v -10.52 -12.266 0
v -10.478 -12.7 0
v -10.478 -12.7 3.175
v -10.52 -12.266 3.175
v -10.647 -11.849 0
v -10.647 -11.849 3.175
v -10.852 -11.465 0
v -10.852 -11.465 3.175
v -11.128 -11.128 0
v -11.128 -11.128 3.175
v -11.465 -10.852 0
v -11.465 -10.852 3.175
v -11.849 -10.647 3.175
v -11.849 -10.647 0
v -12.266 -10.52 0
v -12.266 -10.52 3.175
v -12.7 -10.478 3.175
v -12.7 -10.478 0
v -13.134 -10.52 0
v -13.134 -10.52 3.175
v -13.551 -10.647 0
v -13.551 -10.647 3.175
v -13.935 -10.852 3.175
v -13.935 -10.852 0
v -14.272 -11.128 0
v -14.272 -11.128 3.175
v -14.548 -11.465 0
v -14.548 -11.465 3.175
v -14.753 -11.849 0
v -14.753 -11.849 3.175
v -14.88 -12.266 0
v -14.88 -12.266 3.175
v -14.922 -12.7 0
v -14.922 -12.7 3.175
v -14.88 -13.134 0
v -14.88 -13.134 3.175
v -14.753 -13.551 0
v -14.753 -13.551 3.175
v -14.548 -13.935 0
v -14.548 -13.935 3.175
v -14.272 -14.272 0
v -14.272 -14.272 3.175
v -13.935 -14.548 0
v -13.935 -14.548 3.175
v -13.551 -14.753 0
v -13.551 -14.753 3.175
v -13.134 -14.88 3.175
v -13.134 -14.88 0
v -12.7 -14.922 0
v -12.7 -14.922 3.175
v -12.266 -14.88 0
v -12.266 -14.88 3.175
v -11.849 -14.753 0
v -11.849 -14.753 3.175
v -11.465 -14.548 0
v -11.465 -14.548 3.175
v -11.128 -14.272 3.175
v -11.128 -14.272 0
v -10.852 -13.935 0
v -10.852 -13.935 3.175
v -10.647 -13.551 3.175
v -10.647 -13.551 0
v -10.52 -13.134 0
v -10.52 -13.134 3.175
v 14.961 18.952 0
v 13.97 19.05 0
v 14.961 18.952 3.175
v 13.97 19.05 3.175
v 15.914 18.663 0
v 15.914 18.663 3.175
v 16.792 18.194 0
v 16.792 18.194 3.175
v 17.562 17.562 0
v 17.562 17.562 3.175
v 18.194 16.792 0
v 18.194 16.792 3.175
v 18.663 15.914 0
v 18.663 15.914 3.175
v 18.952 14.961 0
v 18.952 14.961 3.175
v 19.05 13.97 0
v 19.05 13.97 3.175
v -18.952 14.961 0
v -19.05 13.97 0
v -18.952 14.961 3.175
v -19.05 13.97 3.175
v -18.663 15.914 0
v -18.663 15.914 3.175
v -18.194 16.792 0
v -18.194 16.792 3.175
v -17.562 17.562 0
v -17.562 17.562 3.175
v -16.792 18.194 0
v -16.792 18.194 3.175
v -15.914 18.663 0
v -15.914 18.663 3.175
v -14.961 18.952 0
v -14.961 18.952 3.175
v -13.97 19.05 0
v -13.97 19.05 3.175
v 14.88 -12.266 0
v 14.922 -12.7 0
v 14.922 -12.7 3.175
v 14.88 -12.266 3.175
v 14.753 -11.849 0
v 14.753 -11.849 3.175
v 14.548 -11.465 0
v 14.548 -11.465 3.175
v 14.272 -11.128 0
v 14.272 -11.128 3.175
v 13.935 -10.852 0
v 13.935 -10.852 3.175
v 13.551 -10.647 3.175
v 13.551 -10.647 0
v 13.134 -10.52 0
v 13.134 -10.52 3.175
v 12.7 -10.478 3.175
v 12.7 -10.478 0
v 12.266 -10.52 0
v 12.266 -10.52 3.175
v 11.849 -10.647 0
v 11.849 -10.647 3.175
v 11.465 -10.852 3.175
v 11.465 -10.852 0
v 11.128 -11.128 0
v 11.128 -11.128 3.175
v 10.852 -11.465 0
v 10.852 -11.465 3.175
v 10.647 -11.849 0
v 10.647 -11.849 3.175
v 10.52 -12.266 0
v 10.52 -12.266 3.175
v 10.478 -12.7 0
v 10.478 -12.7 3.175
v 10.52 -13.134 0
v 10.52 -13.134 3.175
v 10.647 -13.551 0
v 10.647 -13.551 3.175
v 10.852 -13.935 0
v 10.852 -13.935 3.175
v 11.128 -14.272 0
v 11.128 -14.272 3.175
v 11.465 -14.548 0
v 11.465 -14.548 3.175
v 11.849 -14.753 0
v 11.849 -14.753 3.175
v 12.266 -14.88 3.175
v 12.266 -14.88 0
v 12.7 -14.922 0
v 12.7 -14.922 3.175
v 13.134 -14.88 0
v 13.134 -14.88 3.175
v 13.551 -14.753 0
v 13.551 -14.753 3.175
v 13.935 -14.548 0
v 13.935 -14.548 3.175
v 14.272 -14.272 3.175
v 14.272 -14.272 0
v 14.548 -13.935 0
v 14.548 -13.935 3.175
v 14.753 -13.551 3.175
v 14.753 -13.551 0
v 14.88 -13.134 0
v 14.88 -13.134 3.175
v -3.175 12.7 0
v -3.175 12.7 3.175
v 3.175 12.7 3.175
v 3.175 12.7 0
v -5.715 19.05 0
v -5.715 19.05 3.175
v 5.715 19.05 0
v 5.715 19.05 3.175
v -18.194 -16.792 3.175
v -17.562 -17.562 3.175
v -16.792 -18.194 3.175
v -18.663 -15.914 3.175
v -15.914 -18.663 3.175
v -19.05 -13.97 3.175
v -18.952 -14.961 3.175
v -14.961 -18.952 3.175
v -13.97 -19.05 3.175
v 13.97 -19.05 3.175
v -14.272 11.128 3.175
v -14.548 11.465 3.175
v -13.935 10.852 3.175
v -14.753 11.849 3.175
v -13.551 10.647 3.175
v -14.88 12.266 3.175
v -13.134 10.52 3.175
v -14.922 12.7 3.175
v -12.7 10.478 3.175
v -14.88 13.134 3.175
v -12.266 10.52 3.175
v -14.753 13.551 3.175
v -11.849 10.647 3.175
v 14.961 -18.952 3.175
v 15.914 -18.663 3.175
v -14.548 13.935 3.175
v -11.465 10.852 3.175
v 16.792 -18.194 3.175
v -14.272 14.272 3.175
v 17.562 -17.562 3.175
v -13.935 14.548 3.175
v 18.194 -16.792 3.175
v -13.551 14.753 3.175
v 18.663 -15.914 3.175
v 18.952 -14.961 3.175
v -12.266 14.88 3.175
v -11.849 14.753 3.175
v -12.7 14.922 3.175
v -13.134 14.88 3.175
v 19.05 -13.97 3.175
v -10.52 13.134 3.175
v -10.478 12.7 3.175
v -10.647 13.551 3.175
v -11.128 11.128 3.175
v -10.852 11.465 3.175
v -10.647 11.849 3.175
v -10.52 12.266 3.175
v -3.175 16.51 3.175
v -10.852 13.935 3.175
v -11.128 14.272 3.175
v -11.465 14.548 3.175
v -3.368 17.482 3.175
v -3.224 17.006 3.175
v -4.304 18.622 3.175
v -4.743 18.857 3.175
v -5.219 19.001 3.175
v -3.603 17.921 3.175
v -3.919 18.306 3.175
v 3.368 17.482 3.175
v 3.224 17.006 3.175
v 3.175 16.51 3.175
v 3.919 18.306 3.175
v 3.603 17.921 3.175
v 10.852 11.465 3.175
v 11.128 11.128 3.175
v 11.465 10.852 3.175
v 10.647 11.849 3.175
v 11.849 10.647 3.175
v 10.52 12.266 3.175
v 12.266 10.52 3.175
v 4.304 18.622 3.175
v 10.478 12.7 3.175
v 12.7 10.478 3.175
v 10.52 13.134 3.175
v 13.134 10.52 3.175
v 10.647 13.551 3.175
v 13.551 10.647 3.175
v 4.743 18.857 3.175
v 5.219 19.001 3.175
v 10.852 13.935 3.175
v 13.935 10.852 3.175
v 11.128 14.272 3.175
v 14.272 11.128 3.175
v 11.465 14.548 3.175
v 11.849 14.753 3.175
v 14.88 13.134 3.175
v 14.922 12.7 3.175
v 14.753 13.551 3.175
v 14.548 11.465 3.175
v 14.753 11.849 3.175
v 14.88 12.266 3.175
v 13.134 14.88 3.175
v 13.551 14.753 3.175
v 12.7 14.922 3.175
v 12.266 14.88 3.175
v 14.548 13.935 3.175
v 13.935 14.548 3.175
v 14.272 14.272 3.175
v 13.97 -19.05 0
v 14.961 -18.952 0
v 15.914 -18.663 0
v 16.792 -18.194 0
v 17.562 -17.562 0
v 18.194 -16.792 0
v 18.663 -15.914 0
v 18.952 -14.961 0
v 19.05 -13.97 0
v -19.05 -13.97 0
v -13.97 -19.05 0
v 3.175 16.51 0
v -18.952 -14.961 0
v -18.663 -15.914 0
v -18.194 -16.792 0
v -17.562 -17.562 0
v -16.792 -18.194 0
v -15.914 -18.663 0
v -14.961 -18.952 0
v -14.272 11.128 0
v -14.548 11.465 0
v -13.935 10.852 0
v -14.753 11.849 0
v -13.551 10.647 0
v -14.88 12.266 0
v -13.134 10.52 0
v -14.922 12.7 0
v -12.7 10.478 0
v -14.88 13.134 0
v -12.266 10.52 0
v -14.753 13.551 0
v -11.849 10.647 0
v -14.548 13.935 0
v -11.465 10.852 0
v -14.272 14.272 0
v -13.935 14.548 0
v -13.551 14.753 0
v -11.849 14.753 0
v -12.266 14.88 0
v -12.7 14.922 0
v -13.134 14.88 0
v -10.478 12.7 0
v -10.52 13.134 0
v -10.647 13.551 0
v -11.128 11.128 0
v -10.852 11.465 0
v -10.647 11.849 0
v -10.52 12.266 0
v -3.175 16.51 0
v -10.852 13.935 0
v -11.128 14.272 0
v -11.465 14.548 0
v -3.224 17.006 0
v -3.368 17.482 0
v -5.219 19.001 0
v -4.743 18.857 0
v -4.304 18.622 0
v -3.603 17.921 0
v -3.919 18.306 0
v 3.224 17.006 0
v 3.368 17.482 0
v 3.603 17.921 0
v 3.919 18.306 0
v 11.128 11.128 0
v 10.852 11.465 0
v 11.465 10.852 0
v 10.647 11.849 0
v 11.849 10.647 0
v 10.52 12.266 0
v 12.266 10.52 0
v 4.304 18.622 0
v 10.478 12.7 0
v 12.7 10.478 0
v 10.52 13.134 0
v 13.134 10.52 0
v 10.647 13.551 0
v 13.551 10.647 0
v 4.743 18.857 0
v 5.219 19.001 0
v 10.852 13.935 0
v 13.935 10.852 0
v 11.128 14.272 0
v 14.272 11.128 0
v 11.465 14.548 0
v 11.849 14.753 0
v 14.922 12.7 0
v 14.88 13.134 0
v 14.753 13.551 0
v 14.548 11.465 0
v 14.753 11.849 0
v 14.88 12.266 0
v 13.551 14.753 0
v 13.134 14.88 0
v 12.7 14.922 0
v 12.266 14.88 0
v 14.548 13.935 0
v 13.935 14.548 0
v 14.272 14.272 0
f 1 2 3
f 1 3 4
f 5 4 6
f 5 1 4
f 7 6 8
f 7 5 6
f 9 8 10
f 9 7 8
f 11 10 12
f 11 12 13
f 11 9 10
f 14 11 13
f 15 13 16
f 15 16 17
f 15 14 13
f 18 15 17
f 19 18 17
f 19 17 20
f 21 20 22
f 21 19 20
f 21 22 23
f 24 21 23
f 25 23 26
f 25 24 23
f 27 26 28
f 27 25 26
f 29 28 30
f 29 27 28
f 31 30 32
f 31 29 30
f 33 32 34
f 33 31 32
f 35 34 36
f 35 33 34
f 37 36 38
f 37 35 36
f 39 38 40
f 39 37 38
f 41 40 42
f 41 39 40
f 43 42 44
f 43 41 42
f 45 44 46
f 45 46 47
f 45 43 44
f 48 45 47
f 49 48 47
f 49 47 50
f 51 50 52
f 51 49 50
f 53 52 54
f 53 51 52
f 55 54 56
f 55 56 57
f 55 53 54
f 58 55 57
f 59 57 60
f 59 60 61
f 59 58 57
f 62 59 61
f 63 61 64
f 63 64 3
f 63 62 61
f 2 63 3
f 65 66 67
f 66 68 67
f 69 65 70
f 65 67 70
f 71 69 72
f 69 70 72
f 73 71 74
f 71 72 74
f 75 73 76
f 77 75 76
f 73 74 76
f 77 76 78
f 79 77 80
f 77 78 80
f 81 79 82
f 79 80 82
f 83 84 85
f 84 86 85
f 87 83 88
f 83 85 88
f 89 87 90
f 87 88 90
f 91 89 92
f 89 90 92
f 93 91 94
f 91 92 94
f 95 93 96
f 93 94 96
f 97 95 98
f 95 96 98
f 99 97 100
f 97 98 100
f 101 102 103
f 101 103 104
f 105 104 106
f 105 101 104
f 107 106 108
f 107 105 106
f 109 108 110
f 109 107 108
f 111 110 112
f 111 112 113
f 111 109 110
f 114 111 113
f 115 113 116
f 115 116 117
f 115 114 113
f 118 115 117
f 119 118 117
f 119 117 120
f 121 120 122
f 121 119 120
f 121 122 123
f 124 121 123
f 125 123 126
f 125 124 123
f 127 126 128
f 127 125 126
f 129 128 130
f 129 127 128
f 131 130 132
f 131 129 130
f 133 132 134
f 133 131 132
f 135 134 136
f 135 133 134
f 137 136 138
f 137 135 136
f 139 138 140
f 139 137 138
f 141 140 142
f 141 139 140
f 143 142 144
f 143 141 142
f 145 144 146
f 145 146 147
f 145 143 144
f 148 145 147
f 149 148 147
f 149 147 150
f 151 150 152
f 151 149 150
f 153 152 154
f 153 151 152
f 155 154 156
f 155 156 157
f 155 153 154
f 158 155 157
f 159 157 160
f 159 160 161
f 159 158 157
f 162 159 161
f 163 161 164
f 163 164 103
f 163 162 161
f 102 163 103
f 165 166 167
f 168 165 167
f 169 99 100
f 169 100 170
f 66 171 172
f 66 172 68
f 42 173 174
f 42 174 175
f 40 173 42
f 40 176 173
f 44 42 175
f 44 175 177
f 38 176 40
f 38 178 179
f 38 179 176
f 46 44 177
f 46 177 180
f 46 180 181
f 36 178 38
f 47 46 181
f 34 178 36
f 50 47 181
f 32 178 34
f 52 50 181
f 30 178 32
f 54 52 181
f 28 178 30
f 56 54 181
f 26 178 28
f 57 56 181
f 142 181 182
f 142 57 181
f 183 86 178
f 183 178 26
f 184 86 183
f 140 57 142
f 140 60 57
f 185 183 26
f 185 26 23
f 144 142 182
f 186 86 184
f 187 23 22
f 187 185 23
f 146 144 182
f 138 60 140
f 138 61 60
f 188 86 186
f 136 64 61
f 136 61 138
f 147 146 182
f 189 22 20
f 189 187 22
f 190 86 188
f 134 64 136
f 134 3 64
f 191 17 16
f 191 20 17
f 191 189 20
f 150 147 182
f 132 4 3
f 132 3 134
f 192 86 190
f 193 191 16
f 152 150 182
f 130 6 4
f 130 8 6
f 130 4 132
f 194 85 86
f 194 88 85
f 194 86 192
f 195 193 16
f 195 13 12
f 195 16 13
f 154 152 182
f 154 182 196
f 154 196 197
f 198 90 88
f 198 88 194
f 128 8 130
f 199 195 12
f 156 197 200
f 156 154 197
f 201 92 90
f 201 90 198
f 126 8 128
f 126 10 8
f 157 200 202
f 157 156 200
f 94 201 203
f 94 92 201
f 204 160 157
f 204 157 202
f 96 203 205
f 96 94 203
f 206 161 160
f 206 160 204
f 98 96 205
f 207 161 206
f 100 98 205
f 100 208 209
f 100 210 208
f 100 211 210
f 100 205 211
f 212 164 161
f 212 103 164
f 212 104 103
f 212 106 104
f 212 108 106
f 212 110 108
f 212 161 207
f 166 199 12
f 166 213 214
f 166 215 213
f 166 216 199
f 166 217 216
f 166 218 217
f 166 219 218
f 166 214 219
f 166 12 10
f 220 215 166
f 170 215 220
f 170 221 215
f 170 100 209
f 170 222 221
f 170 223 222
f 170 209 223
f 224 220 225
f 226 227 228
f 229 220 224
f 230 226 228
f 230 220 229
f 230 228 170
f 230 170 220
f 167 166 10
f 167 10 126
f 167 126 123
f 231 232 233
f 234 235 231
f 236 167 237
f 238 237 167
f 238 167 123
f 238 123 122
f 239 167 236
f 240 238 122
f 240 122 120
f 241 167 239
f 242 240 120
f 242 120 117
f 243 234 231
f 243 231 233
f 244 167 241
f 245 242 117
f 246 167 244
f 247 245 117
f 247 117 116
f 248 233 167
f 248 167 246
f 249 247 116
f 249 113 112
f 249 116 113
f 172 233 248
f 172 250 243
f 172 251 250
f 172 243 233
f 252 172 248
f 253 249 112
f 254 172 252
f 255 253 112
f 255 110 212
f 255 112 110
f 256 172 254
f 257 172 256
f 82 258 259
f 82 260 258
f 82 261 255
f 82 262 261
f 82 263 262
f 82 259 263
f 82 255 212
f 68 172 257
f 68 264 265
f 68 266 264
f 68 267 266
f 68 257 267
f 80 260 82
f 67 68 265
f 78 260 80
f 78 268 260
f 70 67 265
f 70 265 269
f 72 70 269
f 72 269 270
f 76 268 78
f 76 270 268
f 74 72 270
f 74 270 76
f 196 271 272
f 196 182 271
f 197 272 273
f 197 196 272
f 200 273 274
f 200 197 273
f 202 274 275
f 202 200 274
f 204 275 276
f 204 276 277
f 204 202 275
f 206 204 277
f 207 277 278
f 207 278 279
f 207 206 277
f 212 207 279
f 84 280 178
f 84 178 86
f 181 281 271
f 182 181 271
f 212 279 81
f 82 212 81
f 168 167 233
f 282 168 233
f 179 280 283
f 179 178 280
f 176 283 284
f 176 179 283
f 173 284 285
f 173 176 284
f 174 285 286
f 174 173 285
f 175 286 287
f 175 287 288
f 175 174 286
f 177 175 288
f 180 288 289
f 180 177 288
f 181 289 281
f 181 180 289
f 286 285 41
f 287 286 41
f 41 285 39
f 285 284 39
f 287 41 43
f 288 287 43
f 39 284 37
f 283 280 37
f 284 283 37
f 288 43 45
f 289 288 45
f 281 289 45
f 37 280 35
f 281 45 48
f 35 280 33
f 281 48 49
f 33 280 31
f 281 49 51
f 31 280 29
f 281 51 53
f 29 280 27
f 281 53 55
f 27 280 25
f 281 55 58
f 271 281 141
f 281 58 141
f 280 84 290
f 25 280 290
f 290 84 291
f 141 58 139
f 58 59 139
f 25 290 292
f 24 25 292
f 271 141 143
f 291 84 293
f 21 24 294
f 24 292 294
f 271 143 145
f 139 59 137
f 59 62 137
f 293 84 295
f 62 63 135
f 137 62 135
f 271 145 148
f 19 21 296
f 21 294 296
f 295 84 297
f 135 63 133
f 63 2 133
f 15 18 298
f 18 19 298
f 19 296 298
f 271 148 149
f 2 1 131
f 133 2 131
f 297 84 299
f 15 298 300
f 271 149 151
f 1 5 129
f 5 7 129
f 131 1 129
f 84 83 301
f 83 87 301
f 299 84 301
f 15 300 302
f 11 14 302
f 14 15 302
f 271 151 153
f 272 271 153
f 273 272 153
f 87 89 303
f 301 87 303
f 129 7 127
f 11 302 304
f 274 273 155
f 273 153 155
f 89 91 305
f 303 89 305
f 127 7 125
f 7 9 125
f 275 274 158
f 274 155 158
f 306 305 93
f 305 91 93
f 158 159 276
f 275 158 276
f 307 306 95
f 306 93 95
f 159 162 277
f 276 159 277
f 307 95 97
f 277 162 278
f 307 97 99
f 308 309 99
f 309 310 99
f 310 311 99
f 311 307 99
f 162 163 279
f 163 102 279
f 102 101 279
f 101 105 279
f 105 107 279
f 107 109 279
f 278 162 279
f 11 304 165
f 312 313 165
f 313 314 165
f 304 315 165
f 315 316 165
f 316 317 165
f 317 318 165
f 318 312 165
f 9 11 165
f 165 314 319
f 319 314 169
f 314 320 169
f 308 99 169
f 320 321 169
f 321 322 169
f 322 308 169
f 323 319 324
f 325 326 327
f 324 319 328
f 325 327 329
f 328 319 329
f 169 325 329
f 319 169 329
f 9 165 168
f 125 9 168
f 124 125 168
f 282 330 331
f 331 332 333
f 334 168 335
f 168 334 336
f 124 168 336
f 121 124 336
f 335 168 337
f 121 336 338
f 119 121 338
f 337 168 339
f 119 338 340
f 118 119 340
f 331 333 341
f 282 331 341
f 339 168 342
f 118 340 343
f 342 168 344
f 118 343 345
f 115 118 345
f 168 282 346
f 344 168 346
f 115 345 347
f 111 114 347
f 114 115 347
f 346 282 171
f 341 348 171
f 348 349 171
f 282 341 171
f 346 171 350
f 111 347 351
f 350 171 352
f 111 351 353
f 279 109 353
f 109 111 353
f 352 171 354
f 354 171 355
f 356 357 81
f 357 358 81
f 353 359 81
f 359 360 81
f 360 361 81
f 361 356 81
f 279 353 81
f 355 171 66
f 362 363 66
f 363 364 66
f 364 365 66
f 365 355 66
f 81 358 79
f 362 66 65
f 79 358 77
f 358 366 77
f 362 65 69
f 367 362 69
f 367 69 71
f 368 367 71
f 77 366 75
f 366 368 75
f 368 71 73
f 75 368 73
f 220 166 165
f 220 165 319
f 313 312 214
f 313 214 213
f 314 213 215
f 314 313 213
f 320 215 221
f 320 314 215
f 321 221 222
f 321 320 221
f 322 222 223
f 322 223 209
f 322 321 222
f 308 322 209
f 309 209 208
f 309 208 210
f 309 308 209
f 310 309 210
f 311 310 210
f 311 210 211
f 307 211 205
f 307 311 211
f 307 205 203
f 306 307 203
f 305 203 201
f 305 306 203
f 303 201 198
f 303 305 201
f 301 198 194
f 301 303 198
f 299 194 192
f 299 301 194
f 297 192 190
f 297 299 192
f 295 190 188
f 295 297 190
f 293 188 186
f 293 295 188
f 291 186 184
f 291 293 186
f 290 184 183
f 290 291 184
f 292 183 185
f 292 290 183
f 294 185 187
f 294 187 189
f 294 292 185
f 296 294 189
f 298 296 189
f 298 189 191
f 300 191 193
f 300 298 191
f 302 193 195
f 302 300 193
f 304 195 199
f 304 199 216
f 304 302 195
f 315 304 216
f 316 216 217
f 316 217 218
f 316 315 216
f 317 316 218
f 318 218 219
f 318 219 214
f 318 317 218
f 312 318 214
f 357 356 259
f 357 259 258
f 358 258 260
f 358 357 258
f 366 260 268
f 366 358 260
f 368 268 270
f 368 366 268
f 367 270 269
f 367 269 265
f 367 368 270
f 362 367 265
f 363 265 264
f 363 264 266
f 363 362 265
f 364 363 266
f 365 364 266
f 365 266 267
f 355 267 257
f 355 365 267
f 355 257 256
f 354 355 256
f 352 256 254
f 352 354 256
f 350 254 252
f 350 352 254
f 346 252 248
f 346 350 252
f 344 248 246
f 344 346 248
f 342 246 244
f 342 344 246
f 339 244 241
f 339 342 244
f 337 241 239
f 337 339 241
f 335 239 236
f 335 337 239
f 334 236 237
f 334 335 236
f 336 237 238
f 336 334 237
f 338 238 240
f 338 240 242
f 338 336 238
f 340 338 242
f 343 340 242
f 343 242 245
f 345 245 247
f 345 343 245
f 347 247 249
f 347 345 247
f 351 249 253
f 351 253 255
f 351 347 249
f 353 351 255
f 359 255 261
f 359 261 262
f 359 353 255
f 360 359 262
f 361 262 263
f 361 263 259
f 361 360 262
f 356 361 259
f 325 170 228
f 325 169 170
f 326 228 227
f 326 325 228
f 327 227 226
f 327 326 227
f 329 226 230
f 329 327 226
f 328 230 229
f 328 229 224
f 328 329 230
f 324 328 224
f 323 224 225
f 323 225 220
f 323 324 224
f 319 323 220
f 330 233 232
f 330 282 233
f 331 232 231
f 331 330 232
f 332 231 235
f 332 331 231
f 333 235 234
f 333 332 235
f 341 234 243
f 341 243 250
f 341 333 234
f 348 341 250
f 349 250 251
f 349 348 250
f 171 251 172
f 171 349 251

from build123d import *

# Parameters (mm, degrees)
F0_W     = 38.1
F0_H     = 38.1
F0_R     = 2.2225
F1_DEPTH = 3.175
F2_R     = 5.08
F3_W     = 6.35
F3_H     = 6.35
F4_DEPTH = 25.4
F5_R     = 2.54


with BuildPart() as f1:
    # F0 (on Top) → F1 (new body)
    with BuildSketch(Plane.XY):
        Rectangle(F0_W, F0_H)
        with Locations((-12.7, -12.7)):
            Circle(F0_R, mode=Mode.SUBTRACT)
        with Locations((12.7, -12.7)):
            Circle(F0_R, mode=Mode.SUBTRACT)
        with Locations((-12.7, 12.7)):
            Circle(F0_R, mode=Mode.SUBTRACT)
        with Locations((12.7, 12.7)):
            Circle(F0_R, mode=Mode.SUBTRACT)
    extrude(amount=F1_DEPTH)

    # F2
    f2_edges = [f1.edges().sort_by_distance(p)[0] for p in [
        (19.05, -19.05, 1.5875),
        (19.05, 19.05, 1.5875),
        (-19.05, -19.05, 1.5875),
        (-19.05, 19.05, 1.5875),
    ]]
    fillet(f2_edges, radius=F2_R)

    # F3 (on face) → F4 (cut)
    with BuildSketch(Plane.XY.offset(3.175)):
        with Locations((0, 15.875)):
            Rectangle(F3_W, F3_H)
    extrude(amount=-F4_DEPTH, mode=Mode.SUBTRACT)

    # F5
    f5_edges = [f1.edges().sort_by_distance(p)[0] for p in [
        (-3.175, 19.05, 1.5875),
        (3.175, 19.05, 1.5875),
    ]]
    fillet(f5_edges, radius=F5_R)


solid = f1.part
